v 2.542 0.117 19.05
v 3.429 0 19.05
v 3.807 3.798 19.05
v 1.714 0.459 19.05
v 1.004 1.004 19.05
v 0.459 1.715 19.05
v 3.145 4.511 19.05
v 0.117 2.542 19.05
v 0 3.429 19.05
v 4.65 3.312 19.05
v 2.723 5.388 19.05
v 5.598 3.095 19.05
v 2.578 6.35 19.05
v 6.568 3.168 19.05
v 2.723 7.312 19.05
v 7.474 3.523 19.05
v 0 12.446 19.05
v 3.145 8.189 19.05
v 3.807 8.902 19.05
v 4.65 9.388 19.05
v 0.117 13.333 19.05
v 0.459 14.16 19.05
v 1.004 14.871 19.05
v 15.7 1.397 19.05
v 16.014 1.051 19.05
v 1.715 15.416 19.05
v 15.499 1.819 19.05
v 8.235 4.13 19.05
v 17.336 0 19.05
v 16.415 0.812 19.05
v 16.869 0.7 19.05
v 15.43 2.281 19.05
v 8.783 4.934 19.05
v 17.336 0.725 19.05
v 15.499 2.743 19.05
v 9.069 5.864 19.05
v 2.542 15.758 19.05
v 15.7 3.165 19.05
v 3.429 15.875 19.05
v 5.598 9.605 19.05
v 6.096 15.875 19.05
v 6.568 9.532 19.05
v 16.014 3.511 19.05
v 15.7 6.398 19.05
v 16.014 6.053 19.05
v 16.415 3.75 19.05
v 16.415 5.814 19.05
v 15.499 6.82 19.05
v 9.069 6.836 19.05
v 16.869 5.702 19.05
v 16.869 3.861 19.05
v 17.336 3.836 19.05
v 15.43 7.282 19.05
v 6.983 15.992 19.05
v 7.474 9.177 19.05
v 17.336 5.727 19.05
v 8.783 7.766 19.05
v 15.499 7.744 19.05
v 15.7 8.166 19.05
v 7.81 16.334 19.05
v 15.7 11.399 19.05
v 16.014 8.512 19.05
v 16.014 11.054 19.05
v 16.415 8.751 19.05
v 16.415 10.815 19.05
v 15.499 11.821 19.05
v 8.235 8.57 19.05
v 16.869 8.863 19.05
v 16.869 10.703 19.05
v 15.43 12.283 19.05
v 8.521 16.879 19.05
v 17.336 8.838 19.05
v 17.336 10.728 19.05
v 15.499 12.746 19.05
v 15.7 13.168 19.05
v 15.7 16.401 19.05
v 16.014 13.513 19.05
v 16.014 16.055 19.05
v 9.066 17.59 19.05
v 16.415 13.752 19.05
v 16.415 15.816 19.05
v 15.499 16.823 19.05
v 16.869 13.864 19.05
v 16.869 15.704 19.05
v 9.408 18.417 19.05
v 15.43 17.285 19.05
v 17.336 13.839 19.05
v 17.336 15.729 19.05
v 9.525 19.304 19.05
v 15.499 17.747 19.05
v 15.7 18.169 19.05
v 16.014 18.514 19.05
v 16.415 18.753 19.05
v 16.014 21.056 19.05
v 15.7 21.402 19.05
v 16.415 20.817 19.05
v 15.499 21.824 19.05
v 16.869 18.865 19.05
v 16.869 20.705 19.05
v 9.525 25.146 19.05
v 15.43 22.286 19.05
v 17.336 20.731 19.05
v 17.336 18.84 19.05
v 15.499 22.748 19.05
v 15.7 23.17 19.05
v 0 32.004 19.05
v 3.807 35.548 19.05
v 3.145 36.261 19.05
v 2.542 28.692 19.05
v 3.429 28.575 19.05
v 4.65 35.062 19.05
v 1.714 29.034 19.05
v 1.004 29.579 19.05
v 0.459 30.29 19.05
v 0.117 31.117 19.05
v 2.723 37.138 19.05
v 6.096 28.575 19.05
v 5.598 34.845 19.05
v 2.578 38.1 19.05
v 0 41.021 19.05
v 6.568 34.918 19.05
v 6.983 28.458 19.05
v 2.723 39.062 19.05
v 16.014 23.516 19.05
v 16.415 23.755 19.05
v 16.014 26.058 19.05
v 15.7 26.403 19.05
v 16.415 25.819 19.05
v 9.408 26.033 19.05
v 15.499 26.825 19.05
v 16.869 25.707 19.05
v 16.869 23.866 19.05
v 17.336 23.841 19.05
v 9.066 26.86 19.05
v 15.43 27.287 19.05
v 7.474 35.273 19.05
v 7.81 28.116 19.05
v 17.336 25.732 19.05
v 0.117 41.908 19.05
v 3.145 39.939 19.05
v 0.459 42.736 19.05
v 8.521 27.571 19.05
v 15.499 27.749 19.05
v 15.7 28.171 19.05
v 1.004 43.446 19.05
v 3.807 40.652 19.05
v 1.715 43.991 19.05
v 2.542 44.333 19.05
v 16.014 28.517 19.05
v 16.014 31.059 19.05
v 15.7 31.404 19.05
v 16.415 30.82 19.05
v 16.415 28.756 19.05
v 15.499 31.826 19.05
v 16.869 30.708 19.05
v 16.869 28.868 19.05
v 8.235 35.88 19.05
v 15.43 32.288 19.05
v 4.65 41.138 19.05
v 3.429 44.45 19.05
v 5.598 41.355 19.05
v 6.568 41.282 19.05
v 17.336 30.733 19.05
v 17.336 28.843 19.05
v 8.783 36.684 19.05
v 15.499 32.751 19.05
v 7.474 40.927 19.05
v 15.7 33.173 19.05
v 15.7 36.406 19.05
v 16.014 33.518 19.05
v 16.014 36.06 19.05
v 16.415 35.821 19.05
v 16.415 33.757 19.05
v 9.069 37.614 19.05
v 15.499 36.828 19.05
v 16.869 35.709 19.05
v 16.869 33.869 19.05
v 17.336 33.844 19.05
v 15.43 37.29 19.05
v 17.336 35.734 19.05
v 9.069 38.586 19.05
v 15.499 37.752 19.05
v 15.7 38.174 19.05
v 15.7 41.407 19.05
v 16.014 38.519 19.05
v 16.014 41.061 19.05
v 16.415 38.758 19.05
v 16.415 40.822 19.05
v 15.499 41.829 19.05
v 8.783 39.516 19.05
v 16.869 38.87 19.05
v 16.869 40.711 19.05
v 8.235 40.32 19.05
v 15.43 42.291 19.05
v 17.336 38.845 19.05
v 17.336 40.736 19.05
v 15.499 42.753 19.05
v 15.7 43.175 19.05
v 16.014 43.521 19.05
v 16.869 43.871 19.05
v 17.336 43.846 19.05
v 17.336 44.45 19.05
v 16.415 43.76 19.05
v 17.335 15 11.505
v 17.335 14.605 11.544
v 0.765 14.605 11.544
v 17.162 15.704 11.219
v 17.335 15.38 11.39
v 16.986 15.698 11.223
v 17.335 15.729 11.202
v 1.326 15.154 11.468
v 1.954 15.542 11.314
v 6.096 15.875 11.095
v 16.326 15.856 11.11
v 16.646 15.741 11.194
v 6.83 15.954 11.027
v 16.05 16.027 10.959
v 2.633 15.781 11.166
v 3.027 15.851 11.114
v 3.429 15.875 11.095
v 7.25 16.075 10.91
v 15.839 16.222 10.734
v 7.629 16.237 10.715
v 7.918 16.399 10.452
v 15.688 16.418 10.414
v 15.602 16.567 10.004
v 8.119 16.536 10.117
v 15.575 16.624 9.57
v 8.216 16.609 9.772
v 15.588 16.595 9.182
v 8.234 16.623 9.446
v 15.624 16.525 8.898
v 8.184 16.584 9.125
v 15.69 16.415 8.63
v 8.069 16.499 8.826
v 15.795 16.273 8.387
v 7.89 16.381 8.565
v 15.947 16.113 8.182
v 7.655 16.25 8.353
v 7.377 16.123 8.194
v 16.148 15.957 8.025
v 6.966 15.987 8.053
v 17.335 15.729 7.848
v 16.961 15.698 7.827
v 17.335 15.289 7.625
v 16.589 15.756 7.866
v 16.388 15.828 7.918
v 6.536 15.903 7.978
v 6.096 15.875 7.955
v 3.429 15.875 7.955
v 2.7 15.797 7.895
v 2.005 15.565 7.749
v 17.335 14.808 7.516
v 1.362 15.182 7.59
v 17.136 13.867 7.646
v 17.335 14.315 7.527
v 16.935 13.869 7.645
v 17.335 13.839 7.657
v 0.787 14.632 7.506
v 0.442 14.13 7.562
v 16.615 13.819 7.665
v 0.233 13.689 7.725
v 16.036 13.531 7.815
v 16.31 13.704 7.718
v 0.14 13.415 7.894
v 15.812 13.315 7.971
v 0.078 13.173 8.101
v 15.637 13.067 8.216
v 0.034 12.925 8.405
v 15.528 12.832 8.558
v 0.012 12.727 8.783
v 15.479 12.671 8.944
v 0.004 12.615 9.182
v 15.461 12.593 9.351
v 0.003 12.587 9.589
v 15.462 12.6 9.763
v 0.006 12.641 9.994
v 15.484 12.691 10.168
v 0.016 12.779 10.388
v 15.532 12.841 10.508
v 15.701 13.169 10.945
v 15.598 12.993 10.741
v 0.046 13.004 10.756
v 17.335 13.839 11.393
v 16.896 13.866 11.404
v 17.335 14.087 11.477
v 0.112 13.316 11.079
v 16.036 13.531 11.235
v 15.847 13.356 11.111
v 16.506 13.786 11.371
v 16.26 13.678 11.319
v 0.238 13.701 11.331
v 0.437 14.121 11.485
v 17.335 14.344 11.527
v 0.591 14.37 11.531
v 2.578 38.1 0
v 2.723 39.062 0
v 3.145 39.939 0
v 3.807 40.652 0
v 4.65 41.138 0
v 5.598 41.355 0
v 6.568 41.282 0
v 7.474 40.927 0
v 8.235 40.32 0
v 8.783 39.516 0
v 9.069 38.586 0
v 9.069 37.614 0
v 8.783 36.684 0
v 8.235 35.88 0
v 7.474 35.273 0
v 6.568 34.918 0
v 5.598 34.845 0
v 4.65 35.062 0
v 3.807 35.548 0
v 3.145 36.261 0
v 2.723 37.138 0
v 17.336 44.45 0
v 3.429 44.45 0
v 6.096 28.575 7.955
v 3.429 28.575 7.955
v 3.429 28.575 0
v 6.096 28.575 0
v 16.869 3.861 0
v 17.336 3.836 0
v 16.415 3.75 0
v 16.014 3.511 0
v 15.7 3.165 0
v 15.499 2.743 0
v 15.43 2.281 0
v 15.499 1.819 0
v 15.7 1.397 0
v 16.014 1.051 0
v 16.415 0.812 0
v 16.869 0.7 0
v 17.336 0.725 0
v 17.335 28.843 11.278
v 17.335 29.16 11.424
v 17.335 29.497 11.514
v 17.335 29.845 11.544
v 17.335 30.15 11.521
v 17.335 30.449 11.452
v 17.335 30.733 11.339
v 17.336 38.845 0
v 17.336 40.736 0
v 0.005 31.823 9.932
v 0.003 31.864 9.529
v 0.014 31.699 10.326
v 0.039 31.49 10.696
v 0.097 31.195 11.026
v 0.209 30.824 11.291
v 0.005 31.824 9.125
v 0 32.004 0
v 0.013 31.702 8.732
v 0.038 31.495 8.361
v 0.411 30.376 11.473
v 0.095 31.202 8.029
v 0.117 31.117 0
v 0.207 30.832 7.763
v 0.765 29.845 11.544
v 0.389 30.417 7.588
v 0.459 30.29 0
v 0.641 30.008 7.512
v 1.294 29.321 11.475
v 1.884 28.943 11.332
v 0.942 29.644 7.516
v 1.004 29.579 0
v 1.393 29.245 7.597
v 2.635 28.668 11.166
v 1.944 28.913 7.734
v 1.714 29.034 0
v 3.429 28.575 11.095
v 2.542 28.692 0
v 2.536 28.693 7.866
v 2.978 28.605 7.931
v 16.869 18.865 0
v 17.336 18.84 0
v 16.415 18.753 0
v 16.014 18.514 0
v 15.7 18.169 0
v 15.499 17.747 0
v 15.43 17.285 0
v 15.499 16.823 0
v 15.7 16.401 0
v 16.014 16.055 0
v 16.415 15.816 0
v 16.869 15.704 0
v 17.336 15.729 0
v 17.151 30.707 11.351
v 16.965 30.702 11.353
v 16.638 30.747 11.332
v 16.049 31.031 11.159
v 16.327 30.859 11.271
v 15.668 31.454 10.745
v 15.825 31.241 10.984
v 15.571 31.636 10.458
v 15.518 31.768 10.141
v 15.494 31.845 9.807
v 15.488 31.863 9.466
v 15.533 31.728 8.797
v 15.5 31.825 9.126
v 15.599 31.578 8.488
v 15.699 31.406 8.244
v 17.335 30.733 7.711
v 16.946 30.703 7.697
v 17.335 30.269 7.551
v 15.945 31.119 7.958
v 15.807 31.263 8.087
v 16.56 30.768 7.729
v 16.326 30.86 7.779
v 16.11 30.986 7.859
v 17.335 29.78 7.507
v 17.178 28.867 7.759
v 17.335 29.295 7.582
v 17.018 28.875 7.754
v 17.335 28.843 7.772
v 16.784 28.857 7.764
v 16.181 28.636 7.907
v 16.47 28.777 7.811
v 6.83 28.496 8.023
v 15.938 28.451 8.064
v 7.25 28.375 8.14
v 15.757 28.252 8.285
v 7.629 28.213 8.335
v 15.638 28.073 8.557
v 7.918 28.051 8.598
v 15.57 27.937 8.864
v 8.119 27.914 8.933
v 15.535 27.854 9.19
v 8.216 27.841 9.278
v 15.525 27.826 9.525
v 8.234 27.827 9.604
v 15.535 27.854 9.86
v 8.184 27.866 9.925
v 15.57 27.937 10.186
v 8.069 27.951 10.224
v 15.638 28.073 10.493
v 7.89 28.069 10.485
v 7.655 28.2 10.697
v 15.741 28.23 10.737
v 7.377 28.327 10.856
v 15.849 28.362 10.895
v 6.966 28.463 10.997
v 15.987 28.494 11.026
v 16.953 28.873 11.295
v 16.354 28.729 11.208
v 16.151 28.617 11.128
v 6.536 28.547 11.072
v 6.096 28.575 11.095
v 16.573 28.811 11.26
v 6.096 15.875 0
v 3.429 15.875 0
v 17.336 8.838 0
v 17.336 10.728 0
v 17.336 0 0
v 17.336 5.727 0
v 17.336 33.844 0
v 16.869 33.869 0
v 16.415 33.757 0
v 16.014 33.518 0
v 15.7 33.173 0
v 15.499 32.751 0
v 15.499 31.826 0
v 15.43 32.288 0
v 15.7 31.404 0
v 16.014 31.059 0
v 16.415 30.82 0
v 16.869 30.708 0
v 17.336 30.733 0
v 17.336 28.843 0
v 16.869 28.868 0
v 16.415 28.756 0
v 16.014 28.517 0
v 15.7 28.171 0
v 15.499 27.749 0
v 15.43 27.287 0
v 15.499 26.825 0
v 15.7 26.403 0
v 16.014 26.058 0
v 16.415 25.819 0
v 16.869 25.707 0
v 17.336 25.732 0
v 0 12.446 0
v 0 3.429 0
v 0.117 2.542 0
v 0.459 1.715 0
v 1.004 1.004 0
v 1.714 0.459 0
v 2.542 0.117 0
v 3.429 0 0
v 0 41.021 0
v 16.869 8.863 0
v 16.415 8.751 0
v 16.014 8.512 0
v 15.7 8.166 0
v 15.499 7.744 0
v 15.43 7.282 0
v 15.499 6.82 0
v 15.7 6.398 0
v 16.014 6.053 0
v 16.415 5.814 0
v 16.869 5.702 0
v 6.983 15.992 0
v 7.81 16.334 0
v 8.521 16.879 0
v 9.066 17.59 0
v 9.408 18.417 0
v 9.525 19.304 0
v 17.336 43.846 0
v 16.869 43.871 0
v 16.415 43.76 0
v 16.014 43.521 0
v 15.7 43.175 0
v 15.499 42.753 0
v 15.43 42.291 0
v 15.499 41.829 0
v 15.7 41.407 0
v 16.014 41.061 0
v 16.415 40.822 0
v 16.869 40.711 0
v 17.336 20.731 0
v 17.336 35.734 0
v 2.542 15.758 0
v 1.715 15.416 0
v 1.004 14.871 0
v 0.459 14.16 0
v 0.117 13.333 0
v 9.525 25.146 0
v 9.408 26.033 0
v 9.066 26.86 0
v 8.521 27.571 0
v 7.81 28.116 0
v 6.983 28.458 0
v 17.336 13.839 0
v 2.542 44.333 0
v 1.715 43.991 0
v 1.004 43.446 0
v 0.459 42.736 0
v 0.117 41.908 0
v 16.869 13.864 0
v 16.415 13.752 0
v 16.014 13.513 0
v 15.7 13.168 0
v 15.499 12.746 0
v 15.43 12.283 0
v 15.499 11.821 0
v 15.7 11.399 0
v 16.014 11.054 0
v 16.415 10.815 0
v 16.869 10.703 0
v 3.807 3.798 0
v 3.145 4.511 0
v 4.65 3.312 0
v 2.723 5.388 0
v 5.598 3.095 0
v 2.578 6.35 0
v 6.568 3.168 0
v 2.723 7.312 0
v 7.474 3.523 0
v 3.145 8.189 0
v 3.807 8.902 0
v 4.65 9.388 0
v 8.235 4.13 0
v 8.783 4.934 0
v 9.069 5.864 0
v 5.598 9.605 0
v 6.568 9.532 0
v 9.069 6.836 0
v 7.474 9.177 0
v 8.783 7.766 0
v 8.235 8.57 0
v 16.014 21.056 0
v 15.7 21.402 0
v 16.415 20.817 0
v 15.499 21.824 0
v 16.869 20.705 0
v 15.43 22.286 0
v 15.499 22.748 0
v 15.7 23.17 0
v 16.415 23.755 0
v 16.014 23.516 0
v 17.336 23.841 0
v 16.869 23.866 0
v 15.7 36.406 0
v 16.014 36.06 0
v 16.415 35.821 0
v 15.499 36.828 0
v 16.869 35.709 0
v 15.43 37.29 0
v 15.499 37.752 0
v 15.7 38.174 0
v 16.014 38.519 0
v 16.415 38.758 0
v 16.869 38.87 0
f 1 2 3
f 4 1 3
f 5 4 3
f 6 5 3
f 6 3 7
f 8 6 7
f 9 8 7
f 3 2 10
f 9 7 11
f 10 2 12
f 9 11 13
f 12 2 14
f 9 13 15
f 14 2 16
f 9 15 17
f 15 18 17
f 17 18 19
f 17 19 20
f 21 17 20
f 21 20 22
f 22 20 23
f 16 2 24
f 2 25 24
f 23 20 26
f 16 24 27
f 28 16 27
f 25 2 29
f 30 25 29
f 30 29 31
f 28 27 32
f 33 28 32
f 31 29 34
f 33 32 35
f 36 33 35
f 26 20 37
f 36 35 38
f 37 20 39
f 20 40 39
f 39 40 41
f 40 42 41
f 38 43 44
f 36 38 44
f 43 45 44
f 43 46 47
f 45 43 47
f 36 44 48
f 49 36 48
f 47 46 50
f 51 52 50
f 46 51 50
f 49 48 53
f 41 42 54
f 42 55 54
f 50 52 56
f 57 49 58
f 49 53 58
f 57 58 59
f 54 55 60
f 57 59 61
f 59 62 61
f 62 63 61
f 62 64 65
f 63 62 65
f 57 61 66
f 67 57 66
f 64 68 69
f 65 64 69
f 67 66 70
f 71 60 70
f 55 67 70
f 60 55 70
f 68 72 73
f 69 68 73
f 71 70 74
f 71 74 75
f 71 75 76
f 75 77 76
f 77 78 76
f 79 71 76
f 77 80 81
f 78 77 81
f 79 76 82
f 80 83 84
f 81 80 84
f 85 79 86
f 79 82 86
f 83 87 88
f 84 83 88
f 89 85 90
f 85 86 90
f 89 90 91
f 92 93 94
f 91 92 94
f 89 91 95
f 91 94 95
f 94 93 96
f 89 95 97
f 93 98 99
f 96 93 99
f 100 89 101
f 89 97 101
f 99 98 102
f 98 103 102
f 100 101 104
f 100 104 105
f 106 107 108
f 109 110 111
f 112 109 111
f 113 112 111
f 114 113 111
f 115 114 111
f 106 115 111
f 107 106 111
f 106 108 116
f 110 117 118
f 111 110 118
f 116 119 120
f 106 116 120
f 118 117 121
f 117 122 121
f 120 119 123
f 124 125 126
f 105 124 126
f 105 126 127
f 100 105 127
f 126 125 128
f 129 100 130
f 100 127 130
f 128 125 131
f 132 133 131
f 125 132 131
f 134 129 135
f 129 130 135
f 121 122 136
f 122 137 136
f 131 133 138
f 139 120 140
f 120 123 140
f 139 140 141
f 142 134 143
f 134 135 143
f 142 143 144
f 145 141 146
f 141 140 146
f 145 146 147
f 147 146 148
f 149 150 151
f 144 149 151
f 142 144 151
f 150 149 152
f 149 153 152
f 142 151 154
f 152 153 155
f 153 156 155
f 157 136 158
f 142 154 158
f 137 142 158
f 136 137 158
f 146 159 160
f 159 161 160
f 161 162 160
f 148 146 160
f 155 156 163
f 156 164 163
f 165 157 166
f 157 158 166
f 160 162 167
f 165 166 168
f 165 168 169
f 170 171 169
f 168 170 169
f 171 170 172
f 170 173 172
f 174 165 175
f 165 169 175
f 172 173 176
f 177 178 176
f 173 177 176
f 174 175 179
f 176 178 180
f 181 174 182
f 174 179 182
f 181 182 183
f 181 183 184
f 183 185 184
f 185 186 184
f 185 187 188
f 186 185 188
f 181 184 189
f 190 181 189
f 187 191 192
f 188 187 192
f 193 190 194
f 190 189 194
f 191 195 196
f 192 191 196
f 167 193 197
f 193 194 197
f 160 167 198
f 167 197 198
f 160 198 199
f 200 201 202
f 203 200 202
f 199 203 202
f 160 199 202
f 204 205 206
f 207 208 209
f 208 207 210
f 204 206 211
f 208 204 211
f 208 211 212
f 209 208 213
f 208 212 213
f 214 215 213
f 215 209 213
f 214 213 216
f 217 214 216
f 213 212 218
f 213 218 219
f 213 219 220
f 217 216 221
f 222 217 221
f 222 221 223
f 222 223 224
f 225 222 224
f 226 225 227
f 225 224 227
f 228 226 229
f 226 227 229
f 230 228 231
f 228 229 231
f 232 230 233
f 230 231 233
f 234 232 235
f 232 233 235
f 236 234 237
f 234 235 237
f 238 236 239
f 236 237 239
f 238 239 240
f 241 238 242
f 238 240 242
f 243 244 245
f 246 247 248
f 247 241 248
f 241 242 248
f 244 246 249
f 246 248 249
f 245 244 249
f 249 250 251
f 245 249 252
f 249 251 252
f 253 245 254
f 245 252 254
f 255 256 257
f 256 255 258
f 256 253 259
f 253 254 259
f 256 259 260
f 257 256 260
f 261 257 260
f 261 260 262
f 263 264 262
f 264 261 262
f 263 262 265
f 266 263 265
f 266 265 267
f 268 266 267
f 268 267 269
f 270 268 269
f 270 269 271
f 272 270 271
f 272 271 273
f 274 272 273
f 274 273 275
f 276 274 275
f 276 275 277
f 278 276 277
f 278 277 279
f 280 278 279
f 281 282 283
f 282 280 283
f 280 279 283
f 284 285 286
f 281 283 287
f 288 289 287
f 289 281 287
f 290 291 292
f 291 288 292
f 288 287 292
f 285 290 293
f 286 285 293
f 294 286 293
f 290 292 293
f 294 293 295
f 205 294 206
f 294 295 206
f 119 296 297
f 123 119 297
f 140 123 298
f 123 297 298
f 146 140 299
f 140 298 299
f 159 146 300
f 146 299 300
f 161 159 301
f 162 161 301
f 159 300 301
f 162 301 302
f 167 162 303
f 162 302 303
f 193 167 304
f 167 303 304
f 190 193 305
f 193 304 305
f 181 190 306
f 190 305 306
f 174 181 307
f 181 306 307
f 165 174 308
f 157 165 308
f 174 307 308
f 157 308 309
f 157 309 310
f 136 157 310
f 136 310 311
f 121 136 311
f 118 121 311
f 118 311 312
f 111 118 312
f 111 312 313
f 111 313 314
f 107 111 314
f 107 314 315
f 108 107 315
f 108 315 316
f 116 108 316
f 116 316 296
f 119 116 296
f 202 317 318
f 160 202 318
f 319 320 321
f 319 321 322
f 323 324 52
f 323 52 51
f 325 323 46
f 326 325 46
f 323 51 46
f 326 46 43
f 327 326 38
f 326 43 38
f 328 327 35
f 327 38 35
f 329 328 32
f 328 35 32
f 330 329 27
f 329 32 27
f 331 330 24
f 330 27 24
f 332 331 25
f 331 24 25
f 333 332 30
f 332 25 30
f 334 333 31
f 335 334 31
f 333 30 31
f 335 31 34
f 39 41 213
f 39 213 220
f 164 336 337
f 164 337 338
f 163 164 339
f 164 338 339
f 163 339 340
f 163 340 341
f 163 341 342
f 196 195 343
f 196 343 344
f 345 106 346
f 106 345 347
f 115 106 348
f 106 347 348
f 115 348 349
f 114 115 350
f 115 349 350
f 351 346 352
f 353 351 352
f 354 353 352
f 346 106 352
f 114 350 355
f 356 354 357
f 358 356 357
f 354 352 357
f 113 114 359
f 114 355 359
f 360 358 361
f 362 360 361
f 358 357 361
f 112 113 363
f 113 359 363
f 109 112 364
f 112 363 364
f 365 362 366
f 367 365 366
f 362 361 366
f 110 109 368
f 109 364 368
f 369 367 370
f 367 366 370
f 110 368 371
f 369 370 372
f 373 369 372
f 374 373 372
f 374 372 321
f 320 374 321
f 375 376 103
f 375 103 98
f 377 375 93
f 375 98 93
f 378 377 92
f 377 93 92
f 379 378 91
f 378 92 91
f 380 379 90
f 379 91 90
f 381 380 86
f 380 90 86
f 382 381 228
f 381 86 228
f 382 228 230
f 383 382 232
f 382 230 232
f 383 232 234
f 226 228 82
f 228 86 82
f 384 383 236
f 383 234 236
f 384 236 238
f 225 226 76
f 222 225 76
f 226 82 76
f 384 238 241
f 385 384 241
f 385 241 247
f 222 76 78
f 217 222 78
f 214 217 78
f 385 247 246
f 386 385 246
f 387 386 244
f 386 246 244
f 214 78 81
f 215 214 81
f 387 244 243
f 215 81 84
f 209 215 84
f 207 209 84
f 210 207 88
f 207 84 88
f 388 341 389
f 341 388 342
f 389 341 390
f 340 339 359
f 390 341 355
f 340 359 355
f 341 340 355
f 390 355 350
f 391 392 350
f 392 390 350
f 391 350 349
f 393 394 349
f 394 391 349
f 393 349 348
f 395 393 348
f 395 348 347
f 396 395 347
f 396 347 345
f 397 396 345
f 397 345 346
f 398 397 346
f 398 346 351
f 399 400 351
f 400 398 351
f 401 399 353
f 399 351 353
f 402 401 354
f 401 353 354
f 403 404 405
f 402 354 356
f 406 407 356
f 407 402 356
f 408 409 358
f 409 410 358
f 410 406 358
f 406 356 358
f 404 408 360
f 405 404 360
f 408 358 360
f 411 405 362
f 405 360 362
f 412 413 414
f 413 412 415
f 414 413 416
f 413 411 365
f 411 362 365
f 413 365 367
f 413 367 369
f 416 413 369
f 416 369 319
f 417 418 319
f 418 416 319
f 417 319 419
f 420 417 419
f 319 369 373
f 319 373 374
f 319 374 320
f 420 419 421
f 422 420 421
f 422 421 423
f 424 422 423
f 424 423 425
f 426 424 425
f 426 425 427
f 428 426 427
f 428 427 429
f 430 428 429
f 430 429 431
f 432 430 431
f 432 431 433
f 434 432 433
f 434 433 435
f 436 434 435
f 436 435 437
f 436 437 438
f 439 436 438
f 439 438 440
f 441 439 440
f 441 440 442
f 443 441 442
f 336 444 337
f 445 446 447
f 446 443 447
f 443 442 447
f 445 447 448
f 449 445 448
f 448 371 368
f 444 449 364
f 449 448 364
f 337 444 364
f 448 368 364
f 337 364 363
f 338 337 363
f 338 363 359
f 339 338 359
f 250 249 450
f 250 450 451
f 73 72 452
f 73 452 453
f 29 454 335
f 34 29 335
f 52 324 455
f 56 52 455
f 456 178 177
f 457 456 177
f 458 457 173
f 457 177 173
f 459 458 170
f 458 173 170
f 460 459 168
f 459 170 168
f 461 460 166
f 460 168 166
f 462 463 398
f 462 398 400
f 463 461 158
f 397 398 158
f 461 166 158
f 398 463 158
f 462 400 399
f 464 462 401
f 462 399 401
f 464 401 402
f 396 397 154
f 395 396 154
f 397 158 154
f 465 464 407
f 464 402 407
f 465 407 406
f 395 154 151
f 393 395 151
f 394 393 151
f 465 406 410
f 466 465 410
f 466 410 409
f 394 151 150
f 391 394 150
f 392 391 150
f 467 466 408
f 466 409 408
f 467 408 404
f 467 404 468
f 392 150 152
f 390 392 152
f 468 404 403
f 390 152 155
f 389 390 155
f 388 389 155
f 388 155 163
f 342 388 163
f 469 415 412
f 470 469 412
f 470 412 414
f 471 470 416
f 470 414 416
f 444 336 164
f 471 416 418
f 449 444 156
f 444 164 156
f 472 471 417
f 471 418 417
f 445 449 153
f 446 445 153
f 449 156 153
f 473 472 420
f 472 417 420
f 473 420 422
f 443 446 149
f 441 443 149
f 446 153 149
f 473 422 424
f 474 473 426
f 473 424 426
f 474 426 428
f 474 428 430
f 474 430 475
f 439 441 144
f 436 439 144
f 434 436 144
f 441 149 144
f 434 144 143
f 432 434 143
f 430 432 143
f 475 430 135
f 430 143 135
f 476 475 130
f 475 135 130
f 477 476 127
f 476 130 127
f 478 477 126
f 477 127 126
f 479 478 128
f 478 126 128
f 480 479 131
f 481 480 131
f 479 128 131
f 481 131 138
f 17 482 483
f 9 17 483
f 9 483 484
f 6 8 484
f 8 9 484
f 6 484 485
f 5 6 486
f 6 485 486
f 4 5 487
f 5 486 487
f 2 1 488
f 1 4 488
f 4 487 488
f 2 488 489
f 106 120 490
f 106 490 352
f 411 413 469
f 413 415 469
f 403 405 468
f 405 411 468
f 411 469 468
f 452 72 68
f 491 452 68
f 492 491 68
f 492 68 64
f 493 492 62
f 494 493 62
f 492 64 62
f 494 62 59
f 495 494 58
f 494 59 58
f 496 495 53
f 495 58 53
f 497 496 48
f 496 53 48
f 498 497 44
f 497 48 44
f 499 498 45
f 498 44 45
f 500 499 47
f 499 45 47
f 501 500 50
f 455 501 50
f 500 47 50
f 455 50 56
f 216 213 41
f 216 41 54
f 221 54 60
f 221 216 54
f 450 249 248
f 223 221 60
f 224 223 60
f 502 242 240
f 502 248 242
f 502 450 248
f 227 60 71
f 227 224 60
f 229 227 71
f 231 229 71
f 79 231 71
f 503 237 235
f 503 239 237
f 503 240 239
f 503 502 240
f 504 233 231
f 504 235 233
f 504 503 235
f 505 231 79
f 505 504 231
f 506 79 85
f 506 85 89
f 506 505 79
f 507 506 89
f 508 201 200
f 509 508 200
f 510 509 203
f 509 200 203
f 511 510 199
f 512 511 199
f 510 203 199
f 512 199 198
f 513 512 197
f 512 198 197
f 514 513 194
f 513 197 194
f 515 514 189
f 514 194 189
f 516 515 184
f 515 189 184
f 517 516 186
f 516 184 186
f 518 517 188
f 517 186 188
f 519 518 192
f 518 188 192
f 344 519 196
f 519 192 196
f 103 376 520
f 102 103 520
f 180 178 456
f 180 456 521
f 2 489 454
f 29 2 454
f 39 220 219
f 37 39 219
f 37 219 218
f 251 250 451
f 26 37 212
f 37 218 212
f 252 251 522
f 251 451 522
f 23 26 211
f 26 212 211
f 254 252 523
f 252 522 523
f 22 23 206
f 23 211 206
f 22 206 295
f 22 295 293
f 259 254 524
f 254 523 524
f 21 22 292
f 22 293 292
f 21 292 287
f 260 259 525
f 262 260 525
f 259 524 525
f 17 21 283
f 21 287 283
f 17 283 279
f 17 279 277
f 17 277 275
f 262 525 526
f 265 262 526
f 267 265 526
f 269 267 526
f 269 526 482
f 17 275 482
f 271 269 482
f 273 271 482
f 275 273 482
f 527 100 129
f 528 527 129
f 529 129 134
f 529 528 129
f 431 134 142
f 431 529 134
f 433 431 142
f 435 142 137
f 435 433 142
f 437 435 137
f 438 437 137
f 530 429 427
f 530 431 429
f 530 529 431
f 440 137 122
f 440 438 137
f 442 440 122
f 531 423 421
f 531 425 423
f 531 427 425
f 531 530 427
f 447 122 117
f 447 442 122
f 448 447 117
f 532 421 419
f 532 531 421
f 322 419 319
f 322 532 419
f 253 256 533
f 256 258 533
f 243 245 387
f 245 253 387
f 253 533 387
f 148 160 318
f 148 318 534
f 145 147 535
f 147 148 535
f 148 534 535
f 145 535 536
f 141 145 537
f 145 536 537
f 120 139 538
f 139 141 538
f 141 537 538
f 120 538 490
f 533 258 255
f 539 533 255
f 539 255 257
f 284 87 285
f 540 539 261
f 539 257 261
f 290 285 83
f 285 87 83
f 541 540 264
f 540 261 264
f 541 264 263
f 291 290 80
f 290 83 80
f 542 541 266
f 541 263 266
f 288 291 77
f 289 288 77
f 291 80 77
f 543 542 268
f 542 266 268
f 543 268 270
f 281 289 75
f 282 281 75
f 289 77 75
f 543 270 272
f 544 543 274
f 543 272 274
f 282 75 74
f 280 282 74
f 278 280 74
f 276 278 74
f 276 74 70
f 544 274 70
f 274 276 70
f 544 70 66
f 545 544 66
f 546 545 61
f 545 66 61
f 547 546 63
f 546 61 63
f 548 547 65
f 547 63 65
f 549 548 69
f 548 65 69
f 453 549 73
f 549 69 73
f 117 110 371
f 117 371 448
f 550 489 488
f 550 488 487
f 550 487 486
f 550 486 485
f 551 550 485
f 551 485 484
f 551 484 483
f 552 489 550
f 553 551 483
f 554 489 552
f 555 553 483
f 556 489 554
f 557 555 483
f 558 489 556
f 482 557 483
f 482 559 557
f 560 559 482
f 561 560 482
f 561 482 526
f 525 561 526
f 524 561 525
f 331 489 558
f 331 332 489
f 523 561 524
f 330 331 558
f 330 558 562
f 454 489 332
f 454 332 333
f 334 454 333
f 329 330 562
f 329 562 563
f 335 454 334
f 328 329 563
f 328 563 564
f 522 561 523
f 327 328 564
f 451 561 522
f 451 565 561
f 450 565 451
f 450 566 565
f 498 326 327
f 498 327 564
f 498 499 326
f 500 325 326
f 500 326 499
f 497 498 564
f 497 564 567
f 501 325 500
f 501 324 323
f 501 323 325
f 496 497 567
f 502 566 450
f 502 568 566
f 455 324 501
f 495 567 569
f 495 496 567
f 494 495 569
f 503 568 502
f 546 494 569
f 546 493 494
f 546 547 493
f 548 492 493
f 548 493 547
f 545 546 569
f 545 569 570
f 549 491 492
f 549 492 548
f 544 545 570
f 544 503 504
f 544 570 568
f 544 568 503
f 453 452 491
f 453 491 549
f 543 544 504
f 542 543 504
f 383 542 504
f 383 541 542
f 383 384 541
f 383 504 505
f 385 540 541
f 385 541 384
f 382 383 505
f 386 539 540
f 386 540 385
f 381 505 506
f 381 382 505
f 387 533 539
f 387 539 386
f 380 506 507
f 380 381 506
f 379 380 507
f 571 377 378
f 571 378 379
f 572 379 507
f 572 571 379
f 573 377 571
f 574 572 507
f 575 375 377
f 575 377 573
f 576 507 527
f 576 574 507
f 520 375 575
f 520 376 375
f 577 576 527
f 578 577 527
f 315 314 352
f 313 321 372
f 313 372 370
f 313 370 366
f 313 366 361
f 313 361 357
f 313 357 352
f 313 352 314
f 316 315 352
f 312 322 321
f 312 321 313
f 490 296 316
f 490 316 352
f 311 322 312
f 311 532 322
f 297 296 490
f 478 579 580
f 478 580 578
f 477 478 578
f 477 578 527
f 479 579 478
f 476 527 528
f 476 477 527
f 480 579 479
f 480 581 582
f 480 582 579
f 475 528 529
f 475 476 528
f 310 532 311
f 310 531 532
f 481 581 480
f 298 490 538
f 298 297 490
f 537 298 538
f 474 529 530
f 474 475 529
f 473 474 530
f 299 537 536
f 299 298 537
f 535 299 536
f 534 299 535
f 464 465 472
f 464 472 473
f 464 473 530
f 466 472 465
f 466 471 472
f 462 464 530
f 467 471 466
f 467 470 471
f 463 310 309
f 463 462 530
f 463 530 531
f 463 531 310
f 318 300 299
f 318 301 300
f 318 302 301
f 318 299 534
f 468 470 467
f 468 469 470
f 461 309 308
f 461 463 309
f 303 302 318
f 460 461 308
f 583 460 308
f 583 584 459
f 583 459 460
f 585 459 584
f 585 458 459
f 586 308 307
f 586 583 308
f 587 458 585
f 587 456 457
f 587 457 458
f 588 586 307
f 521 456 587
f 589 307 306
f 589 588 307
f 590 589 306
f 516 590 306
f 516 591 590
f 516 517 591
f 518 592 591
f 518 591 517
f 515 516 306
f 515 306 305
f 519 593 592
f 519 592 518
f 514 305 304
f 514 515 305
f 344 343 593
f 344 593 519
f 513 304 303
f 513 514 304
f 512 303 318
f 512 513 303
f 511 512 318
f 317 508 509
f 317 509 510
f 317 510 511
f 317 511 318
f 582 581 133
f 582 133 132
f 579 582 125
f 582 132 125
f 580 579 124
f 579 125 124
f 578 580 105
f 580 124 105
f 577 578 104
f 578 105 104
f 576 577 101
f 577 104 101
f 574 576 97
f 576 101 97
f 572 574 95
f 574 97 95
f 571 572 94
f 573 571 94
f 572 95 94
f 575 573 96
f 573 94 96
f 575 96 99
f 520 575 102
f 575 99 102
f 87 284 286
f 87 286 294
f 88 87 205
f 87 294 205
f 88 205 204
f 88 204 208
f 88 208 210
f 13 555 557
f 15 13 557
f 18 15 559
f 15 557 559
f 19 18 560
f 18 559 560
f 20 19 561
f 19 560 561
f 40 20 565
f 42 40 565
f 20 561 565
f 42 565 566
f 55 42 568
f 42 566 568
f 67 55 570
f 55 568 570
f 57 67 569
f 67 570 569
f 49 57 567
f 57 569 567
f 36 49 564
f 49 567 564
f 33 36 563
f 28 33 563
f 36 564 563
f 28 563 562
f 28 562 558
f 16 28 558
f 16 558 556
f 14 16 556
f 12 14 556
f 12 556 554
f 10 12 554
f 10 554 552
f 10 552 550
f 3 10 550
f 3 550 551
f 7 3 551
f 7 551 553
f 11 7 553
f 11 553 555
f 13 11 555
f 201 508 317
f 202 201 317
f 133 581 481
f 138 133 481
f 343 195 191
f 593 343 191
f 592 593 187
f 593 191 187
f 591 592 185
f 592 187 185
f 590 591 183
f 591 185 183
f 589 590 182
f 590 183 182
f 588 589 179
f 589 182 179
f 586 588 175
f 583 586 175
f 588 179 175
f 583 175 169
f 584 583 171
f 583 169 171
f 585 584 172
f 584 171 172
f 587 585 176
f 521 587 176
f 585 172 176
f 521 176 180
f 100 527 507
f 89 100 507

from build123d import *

# Parameters (mm, degrees)
BOSS_EXTRUDE1_DEPTH     = 19.05
F_1_4_CLEARANCE_HOLE1_D = 6.5278
F_10_32_TAPPED_HOLE1_D  = 4.0386
SKETCH6_R               = 1.5875
CUT_EXTRUDE1_DEPTH      = 52.373383773
LPATTERN1_COUNT         = 9
LPATTERN1_PITCH         = 5.00126
FILLET1_R               = 3.429


with BuildPart() as part:
    # Sketch1 → Boss-Extrude1 (new body)
    with BuildSketch(Plane.XY):
        Polygon((0, 0), (17.3355, 0), (17.3355, 44.45), (0, 44.45), (0, 28.575), (9.525, 28.575), (9.525, 15.875), (0, 15.875), align=None)
    extrude(amount=BOSS_EXTRUDE1_DEPTH)

    # 1/4 Clearance Hole1 (through all)
    with Locations(Plane.XY.offset(19.05)):
        with Locations((5.842, 38.1), (5.842, 6.35)):
            Hole(F_1_4_CLEARANCE_HOLE1_D / 2)

    # #10-32 Tapped Hole1 (through all)
    with Locations(Plane(origin=(17.3355, 0, 0), x_dir=(0, 0, -1), z_dir=(1, 0, 0))):
        with Locations((-9.525, 14.605), (-9.525, 29.845)):
            Hole(F_10_32_TAPPED_HOLE1_D / 2)

    # Sketch6 → Cut-Extrude1 (cut, symmetric)
    with BuildSketch(Plane.XY.offset(19.05)):
        with Locations((17.018, 2.28092)):
            Circle(SKETCH6_R)
    cut_extrude1 = extrude(amount=CUT_EXTRUDE1_DEPTH, both=True, mode=Mode.SUBTRACT)

    # LPattern1: Cut-Extrude1 ×9
    with Locations(*[(0, i * LPATTERN1_PITCH, 0) for i in range(1, LPATTERN1_COUNT)]):
        add(cut_extrude1, mode=Mode.SUBTRACT)

    # Fillet1
    # the kernel refuses this fillet: 3.429 mm, written as the material it adds along each edge
    with BuildSketch(Plane(origin=(9.525, 15.875, 2.522427543), x_dir=(-1, 0, 0), z_dir=(0, 0, 1))) as fillet1_piece_1_section:
        with BuildLine():
            CenterArc((FILLET1_R, -FILLET1_R), FILLET1_R, 90, 90)
            Line((0, -FILLET1_R), (0, 0))
            Line((0, 0), (FILLET1_R, 0))
        make_face()
    fillet1_piece_1 = extrude(amount=16.527572457, mode=Mode.PRIVATE)
    fillet1_piece_1 = fillet1_piece_1 - Plane(origin=(8.790805855, 14.605, 9.525), x_dir=(0, 0, 1), z_dir=(-1, 0, 0)) * Cylinder(2.0193, 47, mode=Mode.PRIVATE)
    add(fillet1_piece_1)
    with BuildSketch(Plane(origin=(9.525, 28.575, 2.522427543), x_dir=(0, -1, 0), z_dir=(0, 0, 1))) as fillet1_piece_2_section:
        with BuildLine():
            CenterArc((FILLET1_R, -FILLET1_R), FILLET1_R, 90, 90)
            Line((0, -FILLET1_R), (0, 0))
            Line((0, 0), (FILLET1_R, 0))
        make_face()
    fillet1_piece_2 = extrude(amount=16.527572457, mode=Mode.PRIVATE)
    fillet1_piece_2 = fillet1_piece_2 - Plane(origin=(8.790805812, 29.845, 9.525), x_dir=(0, 0, 1), z_dir=(-1, 0, 0)) * Cylinder(2.0193, 47, mode=Mode.PRIVATE)
    add(fillet1_piece_2)
    with BuildSketch(Plane(origin=(9.525, 15.875, 0), x_dir=(-1, 0, 0), z_dir=(0, 0, 1))) as fillet1_piece_3_section:
        with BuildLine():
            CenterArc((FILLET1_R, -FILLET1_R), FILLET1_R, 90, 90)
            Line((0, -FILLET1_R), (0, 0))
            Line((0, 0), (FILLET1_R, 0))
        make_face()
    fillet1_piece_3 = extrude(amount=16.527572457, mode=Mode.PRIVATE)
    fillet1_piece_3 = fillet1_piece_3 - Plane(origin=(8.790805857, 14.605, 9.525), x_dir=(0, 0, 1), z_dir=(-1, 0, 0)) * Cylinder(2.0193, 47, mode=Mode.PRIVATE)
    add(fillet1_piece_3)
    with BuildSketch(Plane(origin=(9.525, 28.575, 0), x_dir=(0, -1, 0), z_dir=(0, 0, 1))) as fillet1_piece_4_section:
        with BuildLine():
            CenterArc((FILLET1_R, -FILLET1_R), FILLET1_R, 90, 90)
            Line((0, -FILLET1_R), (0, 0))
            Line((0, 0), (FILLET1_R, 0))
        make_face()
    fillet1_piece_4 = extrude(amount=16.527572457, mode=Mode.PRIVATE)
    fillet1_piece_4 = fillet1_piece_4 - Plane(origin=(8.790805811, 29.845, 9.525), x_dir=(0, 0, 1), z_dir=(-1, 0, 0)) * Cylinder(2.0193, 47, mode=Mode.PRIVATE)
    add(fillet1_piece_4)
    # the kernel refuses this fillet: 3.429 mm, written as the material it takes off along each edge
    with BuildSketch(Plane(origin=(0, 15.875, 2.522427543), x_dir=(1, 0, 0), z_dir=(0, 0, 1)), Plane(origin=(0, 15.875, -8.5725), x_dir=(1, 0, 0), z_dir=(0, 0, 1))) as fillet1_2_piece_1:
        with BuildLine():
            CenterArc((FILLET1_R, -FILLET1_R), FILLET1_R, 90, 90)
            Line((0, -FILLET1_R), (0, 0))
            Line((0, 0), (FILLET1_R, 0))
        make_face()
    extrude(amount=25.100072457, mode=Mode.SUBTRACT)
    with BuildSketch(Plane(origin=(0, 28.575, 2.522427543), x_dir=(1, 0, 0), z_dir=(0, 0, 1)), Plane(origin=(0, 28.575, -8.5725), x_dir=(1, 0, 0), z_dir=(0, 0, 1))) as fillet1_2_piece_2:
        with BuildLine():
            CenterArc((FILLET1_R, FILLET1_R), FILLET1_R, 180, 90)
            Line((0, FILLET1_R), (0, 0))
            Line((0, 0), (FILLET1_R, 0))
        make_face()
    extrude(amount=25.100072457, mode=Mode.SUBTRACT)
    with BuildSketch(Plane(origin=(0, 44.45, -8.5725), x_dir=(0, -1, 0), z_dir=(0, 0, 1)), Plane(origin=(0, 0, -8.5725), x_dir=(1, 0, 0), z_dir=(0, 0, 1))) as fillet1_2_piece_3:
        with BuildLine():
            CenterArc((FILLET1_R, FILLET1_R), FILLET1_R, 180, 90)
            Line((0, FILLET1_R), (0, 0))
            Line((0, 0), (FILLET1_R, 0))
        make_face()
    extrude(amount=36.195, mode=Mode.SUBTRACT)


solid = part.part
